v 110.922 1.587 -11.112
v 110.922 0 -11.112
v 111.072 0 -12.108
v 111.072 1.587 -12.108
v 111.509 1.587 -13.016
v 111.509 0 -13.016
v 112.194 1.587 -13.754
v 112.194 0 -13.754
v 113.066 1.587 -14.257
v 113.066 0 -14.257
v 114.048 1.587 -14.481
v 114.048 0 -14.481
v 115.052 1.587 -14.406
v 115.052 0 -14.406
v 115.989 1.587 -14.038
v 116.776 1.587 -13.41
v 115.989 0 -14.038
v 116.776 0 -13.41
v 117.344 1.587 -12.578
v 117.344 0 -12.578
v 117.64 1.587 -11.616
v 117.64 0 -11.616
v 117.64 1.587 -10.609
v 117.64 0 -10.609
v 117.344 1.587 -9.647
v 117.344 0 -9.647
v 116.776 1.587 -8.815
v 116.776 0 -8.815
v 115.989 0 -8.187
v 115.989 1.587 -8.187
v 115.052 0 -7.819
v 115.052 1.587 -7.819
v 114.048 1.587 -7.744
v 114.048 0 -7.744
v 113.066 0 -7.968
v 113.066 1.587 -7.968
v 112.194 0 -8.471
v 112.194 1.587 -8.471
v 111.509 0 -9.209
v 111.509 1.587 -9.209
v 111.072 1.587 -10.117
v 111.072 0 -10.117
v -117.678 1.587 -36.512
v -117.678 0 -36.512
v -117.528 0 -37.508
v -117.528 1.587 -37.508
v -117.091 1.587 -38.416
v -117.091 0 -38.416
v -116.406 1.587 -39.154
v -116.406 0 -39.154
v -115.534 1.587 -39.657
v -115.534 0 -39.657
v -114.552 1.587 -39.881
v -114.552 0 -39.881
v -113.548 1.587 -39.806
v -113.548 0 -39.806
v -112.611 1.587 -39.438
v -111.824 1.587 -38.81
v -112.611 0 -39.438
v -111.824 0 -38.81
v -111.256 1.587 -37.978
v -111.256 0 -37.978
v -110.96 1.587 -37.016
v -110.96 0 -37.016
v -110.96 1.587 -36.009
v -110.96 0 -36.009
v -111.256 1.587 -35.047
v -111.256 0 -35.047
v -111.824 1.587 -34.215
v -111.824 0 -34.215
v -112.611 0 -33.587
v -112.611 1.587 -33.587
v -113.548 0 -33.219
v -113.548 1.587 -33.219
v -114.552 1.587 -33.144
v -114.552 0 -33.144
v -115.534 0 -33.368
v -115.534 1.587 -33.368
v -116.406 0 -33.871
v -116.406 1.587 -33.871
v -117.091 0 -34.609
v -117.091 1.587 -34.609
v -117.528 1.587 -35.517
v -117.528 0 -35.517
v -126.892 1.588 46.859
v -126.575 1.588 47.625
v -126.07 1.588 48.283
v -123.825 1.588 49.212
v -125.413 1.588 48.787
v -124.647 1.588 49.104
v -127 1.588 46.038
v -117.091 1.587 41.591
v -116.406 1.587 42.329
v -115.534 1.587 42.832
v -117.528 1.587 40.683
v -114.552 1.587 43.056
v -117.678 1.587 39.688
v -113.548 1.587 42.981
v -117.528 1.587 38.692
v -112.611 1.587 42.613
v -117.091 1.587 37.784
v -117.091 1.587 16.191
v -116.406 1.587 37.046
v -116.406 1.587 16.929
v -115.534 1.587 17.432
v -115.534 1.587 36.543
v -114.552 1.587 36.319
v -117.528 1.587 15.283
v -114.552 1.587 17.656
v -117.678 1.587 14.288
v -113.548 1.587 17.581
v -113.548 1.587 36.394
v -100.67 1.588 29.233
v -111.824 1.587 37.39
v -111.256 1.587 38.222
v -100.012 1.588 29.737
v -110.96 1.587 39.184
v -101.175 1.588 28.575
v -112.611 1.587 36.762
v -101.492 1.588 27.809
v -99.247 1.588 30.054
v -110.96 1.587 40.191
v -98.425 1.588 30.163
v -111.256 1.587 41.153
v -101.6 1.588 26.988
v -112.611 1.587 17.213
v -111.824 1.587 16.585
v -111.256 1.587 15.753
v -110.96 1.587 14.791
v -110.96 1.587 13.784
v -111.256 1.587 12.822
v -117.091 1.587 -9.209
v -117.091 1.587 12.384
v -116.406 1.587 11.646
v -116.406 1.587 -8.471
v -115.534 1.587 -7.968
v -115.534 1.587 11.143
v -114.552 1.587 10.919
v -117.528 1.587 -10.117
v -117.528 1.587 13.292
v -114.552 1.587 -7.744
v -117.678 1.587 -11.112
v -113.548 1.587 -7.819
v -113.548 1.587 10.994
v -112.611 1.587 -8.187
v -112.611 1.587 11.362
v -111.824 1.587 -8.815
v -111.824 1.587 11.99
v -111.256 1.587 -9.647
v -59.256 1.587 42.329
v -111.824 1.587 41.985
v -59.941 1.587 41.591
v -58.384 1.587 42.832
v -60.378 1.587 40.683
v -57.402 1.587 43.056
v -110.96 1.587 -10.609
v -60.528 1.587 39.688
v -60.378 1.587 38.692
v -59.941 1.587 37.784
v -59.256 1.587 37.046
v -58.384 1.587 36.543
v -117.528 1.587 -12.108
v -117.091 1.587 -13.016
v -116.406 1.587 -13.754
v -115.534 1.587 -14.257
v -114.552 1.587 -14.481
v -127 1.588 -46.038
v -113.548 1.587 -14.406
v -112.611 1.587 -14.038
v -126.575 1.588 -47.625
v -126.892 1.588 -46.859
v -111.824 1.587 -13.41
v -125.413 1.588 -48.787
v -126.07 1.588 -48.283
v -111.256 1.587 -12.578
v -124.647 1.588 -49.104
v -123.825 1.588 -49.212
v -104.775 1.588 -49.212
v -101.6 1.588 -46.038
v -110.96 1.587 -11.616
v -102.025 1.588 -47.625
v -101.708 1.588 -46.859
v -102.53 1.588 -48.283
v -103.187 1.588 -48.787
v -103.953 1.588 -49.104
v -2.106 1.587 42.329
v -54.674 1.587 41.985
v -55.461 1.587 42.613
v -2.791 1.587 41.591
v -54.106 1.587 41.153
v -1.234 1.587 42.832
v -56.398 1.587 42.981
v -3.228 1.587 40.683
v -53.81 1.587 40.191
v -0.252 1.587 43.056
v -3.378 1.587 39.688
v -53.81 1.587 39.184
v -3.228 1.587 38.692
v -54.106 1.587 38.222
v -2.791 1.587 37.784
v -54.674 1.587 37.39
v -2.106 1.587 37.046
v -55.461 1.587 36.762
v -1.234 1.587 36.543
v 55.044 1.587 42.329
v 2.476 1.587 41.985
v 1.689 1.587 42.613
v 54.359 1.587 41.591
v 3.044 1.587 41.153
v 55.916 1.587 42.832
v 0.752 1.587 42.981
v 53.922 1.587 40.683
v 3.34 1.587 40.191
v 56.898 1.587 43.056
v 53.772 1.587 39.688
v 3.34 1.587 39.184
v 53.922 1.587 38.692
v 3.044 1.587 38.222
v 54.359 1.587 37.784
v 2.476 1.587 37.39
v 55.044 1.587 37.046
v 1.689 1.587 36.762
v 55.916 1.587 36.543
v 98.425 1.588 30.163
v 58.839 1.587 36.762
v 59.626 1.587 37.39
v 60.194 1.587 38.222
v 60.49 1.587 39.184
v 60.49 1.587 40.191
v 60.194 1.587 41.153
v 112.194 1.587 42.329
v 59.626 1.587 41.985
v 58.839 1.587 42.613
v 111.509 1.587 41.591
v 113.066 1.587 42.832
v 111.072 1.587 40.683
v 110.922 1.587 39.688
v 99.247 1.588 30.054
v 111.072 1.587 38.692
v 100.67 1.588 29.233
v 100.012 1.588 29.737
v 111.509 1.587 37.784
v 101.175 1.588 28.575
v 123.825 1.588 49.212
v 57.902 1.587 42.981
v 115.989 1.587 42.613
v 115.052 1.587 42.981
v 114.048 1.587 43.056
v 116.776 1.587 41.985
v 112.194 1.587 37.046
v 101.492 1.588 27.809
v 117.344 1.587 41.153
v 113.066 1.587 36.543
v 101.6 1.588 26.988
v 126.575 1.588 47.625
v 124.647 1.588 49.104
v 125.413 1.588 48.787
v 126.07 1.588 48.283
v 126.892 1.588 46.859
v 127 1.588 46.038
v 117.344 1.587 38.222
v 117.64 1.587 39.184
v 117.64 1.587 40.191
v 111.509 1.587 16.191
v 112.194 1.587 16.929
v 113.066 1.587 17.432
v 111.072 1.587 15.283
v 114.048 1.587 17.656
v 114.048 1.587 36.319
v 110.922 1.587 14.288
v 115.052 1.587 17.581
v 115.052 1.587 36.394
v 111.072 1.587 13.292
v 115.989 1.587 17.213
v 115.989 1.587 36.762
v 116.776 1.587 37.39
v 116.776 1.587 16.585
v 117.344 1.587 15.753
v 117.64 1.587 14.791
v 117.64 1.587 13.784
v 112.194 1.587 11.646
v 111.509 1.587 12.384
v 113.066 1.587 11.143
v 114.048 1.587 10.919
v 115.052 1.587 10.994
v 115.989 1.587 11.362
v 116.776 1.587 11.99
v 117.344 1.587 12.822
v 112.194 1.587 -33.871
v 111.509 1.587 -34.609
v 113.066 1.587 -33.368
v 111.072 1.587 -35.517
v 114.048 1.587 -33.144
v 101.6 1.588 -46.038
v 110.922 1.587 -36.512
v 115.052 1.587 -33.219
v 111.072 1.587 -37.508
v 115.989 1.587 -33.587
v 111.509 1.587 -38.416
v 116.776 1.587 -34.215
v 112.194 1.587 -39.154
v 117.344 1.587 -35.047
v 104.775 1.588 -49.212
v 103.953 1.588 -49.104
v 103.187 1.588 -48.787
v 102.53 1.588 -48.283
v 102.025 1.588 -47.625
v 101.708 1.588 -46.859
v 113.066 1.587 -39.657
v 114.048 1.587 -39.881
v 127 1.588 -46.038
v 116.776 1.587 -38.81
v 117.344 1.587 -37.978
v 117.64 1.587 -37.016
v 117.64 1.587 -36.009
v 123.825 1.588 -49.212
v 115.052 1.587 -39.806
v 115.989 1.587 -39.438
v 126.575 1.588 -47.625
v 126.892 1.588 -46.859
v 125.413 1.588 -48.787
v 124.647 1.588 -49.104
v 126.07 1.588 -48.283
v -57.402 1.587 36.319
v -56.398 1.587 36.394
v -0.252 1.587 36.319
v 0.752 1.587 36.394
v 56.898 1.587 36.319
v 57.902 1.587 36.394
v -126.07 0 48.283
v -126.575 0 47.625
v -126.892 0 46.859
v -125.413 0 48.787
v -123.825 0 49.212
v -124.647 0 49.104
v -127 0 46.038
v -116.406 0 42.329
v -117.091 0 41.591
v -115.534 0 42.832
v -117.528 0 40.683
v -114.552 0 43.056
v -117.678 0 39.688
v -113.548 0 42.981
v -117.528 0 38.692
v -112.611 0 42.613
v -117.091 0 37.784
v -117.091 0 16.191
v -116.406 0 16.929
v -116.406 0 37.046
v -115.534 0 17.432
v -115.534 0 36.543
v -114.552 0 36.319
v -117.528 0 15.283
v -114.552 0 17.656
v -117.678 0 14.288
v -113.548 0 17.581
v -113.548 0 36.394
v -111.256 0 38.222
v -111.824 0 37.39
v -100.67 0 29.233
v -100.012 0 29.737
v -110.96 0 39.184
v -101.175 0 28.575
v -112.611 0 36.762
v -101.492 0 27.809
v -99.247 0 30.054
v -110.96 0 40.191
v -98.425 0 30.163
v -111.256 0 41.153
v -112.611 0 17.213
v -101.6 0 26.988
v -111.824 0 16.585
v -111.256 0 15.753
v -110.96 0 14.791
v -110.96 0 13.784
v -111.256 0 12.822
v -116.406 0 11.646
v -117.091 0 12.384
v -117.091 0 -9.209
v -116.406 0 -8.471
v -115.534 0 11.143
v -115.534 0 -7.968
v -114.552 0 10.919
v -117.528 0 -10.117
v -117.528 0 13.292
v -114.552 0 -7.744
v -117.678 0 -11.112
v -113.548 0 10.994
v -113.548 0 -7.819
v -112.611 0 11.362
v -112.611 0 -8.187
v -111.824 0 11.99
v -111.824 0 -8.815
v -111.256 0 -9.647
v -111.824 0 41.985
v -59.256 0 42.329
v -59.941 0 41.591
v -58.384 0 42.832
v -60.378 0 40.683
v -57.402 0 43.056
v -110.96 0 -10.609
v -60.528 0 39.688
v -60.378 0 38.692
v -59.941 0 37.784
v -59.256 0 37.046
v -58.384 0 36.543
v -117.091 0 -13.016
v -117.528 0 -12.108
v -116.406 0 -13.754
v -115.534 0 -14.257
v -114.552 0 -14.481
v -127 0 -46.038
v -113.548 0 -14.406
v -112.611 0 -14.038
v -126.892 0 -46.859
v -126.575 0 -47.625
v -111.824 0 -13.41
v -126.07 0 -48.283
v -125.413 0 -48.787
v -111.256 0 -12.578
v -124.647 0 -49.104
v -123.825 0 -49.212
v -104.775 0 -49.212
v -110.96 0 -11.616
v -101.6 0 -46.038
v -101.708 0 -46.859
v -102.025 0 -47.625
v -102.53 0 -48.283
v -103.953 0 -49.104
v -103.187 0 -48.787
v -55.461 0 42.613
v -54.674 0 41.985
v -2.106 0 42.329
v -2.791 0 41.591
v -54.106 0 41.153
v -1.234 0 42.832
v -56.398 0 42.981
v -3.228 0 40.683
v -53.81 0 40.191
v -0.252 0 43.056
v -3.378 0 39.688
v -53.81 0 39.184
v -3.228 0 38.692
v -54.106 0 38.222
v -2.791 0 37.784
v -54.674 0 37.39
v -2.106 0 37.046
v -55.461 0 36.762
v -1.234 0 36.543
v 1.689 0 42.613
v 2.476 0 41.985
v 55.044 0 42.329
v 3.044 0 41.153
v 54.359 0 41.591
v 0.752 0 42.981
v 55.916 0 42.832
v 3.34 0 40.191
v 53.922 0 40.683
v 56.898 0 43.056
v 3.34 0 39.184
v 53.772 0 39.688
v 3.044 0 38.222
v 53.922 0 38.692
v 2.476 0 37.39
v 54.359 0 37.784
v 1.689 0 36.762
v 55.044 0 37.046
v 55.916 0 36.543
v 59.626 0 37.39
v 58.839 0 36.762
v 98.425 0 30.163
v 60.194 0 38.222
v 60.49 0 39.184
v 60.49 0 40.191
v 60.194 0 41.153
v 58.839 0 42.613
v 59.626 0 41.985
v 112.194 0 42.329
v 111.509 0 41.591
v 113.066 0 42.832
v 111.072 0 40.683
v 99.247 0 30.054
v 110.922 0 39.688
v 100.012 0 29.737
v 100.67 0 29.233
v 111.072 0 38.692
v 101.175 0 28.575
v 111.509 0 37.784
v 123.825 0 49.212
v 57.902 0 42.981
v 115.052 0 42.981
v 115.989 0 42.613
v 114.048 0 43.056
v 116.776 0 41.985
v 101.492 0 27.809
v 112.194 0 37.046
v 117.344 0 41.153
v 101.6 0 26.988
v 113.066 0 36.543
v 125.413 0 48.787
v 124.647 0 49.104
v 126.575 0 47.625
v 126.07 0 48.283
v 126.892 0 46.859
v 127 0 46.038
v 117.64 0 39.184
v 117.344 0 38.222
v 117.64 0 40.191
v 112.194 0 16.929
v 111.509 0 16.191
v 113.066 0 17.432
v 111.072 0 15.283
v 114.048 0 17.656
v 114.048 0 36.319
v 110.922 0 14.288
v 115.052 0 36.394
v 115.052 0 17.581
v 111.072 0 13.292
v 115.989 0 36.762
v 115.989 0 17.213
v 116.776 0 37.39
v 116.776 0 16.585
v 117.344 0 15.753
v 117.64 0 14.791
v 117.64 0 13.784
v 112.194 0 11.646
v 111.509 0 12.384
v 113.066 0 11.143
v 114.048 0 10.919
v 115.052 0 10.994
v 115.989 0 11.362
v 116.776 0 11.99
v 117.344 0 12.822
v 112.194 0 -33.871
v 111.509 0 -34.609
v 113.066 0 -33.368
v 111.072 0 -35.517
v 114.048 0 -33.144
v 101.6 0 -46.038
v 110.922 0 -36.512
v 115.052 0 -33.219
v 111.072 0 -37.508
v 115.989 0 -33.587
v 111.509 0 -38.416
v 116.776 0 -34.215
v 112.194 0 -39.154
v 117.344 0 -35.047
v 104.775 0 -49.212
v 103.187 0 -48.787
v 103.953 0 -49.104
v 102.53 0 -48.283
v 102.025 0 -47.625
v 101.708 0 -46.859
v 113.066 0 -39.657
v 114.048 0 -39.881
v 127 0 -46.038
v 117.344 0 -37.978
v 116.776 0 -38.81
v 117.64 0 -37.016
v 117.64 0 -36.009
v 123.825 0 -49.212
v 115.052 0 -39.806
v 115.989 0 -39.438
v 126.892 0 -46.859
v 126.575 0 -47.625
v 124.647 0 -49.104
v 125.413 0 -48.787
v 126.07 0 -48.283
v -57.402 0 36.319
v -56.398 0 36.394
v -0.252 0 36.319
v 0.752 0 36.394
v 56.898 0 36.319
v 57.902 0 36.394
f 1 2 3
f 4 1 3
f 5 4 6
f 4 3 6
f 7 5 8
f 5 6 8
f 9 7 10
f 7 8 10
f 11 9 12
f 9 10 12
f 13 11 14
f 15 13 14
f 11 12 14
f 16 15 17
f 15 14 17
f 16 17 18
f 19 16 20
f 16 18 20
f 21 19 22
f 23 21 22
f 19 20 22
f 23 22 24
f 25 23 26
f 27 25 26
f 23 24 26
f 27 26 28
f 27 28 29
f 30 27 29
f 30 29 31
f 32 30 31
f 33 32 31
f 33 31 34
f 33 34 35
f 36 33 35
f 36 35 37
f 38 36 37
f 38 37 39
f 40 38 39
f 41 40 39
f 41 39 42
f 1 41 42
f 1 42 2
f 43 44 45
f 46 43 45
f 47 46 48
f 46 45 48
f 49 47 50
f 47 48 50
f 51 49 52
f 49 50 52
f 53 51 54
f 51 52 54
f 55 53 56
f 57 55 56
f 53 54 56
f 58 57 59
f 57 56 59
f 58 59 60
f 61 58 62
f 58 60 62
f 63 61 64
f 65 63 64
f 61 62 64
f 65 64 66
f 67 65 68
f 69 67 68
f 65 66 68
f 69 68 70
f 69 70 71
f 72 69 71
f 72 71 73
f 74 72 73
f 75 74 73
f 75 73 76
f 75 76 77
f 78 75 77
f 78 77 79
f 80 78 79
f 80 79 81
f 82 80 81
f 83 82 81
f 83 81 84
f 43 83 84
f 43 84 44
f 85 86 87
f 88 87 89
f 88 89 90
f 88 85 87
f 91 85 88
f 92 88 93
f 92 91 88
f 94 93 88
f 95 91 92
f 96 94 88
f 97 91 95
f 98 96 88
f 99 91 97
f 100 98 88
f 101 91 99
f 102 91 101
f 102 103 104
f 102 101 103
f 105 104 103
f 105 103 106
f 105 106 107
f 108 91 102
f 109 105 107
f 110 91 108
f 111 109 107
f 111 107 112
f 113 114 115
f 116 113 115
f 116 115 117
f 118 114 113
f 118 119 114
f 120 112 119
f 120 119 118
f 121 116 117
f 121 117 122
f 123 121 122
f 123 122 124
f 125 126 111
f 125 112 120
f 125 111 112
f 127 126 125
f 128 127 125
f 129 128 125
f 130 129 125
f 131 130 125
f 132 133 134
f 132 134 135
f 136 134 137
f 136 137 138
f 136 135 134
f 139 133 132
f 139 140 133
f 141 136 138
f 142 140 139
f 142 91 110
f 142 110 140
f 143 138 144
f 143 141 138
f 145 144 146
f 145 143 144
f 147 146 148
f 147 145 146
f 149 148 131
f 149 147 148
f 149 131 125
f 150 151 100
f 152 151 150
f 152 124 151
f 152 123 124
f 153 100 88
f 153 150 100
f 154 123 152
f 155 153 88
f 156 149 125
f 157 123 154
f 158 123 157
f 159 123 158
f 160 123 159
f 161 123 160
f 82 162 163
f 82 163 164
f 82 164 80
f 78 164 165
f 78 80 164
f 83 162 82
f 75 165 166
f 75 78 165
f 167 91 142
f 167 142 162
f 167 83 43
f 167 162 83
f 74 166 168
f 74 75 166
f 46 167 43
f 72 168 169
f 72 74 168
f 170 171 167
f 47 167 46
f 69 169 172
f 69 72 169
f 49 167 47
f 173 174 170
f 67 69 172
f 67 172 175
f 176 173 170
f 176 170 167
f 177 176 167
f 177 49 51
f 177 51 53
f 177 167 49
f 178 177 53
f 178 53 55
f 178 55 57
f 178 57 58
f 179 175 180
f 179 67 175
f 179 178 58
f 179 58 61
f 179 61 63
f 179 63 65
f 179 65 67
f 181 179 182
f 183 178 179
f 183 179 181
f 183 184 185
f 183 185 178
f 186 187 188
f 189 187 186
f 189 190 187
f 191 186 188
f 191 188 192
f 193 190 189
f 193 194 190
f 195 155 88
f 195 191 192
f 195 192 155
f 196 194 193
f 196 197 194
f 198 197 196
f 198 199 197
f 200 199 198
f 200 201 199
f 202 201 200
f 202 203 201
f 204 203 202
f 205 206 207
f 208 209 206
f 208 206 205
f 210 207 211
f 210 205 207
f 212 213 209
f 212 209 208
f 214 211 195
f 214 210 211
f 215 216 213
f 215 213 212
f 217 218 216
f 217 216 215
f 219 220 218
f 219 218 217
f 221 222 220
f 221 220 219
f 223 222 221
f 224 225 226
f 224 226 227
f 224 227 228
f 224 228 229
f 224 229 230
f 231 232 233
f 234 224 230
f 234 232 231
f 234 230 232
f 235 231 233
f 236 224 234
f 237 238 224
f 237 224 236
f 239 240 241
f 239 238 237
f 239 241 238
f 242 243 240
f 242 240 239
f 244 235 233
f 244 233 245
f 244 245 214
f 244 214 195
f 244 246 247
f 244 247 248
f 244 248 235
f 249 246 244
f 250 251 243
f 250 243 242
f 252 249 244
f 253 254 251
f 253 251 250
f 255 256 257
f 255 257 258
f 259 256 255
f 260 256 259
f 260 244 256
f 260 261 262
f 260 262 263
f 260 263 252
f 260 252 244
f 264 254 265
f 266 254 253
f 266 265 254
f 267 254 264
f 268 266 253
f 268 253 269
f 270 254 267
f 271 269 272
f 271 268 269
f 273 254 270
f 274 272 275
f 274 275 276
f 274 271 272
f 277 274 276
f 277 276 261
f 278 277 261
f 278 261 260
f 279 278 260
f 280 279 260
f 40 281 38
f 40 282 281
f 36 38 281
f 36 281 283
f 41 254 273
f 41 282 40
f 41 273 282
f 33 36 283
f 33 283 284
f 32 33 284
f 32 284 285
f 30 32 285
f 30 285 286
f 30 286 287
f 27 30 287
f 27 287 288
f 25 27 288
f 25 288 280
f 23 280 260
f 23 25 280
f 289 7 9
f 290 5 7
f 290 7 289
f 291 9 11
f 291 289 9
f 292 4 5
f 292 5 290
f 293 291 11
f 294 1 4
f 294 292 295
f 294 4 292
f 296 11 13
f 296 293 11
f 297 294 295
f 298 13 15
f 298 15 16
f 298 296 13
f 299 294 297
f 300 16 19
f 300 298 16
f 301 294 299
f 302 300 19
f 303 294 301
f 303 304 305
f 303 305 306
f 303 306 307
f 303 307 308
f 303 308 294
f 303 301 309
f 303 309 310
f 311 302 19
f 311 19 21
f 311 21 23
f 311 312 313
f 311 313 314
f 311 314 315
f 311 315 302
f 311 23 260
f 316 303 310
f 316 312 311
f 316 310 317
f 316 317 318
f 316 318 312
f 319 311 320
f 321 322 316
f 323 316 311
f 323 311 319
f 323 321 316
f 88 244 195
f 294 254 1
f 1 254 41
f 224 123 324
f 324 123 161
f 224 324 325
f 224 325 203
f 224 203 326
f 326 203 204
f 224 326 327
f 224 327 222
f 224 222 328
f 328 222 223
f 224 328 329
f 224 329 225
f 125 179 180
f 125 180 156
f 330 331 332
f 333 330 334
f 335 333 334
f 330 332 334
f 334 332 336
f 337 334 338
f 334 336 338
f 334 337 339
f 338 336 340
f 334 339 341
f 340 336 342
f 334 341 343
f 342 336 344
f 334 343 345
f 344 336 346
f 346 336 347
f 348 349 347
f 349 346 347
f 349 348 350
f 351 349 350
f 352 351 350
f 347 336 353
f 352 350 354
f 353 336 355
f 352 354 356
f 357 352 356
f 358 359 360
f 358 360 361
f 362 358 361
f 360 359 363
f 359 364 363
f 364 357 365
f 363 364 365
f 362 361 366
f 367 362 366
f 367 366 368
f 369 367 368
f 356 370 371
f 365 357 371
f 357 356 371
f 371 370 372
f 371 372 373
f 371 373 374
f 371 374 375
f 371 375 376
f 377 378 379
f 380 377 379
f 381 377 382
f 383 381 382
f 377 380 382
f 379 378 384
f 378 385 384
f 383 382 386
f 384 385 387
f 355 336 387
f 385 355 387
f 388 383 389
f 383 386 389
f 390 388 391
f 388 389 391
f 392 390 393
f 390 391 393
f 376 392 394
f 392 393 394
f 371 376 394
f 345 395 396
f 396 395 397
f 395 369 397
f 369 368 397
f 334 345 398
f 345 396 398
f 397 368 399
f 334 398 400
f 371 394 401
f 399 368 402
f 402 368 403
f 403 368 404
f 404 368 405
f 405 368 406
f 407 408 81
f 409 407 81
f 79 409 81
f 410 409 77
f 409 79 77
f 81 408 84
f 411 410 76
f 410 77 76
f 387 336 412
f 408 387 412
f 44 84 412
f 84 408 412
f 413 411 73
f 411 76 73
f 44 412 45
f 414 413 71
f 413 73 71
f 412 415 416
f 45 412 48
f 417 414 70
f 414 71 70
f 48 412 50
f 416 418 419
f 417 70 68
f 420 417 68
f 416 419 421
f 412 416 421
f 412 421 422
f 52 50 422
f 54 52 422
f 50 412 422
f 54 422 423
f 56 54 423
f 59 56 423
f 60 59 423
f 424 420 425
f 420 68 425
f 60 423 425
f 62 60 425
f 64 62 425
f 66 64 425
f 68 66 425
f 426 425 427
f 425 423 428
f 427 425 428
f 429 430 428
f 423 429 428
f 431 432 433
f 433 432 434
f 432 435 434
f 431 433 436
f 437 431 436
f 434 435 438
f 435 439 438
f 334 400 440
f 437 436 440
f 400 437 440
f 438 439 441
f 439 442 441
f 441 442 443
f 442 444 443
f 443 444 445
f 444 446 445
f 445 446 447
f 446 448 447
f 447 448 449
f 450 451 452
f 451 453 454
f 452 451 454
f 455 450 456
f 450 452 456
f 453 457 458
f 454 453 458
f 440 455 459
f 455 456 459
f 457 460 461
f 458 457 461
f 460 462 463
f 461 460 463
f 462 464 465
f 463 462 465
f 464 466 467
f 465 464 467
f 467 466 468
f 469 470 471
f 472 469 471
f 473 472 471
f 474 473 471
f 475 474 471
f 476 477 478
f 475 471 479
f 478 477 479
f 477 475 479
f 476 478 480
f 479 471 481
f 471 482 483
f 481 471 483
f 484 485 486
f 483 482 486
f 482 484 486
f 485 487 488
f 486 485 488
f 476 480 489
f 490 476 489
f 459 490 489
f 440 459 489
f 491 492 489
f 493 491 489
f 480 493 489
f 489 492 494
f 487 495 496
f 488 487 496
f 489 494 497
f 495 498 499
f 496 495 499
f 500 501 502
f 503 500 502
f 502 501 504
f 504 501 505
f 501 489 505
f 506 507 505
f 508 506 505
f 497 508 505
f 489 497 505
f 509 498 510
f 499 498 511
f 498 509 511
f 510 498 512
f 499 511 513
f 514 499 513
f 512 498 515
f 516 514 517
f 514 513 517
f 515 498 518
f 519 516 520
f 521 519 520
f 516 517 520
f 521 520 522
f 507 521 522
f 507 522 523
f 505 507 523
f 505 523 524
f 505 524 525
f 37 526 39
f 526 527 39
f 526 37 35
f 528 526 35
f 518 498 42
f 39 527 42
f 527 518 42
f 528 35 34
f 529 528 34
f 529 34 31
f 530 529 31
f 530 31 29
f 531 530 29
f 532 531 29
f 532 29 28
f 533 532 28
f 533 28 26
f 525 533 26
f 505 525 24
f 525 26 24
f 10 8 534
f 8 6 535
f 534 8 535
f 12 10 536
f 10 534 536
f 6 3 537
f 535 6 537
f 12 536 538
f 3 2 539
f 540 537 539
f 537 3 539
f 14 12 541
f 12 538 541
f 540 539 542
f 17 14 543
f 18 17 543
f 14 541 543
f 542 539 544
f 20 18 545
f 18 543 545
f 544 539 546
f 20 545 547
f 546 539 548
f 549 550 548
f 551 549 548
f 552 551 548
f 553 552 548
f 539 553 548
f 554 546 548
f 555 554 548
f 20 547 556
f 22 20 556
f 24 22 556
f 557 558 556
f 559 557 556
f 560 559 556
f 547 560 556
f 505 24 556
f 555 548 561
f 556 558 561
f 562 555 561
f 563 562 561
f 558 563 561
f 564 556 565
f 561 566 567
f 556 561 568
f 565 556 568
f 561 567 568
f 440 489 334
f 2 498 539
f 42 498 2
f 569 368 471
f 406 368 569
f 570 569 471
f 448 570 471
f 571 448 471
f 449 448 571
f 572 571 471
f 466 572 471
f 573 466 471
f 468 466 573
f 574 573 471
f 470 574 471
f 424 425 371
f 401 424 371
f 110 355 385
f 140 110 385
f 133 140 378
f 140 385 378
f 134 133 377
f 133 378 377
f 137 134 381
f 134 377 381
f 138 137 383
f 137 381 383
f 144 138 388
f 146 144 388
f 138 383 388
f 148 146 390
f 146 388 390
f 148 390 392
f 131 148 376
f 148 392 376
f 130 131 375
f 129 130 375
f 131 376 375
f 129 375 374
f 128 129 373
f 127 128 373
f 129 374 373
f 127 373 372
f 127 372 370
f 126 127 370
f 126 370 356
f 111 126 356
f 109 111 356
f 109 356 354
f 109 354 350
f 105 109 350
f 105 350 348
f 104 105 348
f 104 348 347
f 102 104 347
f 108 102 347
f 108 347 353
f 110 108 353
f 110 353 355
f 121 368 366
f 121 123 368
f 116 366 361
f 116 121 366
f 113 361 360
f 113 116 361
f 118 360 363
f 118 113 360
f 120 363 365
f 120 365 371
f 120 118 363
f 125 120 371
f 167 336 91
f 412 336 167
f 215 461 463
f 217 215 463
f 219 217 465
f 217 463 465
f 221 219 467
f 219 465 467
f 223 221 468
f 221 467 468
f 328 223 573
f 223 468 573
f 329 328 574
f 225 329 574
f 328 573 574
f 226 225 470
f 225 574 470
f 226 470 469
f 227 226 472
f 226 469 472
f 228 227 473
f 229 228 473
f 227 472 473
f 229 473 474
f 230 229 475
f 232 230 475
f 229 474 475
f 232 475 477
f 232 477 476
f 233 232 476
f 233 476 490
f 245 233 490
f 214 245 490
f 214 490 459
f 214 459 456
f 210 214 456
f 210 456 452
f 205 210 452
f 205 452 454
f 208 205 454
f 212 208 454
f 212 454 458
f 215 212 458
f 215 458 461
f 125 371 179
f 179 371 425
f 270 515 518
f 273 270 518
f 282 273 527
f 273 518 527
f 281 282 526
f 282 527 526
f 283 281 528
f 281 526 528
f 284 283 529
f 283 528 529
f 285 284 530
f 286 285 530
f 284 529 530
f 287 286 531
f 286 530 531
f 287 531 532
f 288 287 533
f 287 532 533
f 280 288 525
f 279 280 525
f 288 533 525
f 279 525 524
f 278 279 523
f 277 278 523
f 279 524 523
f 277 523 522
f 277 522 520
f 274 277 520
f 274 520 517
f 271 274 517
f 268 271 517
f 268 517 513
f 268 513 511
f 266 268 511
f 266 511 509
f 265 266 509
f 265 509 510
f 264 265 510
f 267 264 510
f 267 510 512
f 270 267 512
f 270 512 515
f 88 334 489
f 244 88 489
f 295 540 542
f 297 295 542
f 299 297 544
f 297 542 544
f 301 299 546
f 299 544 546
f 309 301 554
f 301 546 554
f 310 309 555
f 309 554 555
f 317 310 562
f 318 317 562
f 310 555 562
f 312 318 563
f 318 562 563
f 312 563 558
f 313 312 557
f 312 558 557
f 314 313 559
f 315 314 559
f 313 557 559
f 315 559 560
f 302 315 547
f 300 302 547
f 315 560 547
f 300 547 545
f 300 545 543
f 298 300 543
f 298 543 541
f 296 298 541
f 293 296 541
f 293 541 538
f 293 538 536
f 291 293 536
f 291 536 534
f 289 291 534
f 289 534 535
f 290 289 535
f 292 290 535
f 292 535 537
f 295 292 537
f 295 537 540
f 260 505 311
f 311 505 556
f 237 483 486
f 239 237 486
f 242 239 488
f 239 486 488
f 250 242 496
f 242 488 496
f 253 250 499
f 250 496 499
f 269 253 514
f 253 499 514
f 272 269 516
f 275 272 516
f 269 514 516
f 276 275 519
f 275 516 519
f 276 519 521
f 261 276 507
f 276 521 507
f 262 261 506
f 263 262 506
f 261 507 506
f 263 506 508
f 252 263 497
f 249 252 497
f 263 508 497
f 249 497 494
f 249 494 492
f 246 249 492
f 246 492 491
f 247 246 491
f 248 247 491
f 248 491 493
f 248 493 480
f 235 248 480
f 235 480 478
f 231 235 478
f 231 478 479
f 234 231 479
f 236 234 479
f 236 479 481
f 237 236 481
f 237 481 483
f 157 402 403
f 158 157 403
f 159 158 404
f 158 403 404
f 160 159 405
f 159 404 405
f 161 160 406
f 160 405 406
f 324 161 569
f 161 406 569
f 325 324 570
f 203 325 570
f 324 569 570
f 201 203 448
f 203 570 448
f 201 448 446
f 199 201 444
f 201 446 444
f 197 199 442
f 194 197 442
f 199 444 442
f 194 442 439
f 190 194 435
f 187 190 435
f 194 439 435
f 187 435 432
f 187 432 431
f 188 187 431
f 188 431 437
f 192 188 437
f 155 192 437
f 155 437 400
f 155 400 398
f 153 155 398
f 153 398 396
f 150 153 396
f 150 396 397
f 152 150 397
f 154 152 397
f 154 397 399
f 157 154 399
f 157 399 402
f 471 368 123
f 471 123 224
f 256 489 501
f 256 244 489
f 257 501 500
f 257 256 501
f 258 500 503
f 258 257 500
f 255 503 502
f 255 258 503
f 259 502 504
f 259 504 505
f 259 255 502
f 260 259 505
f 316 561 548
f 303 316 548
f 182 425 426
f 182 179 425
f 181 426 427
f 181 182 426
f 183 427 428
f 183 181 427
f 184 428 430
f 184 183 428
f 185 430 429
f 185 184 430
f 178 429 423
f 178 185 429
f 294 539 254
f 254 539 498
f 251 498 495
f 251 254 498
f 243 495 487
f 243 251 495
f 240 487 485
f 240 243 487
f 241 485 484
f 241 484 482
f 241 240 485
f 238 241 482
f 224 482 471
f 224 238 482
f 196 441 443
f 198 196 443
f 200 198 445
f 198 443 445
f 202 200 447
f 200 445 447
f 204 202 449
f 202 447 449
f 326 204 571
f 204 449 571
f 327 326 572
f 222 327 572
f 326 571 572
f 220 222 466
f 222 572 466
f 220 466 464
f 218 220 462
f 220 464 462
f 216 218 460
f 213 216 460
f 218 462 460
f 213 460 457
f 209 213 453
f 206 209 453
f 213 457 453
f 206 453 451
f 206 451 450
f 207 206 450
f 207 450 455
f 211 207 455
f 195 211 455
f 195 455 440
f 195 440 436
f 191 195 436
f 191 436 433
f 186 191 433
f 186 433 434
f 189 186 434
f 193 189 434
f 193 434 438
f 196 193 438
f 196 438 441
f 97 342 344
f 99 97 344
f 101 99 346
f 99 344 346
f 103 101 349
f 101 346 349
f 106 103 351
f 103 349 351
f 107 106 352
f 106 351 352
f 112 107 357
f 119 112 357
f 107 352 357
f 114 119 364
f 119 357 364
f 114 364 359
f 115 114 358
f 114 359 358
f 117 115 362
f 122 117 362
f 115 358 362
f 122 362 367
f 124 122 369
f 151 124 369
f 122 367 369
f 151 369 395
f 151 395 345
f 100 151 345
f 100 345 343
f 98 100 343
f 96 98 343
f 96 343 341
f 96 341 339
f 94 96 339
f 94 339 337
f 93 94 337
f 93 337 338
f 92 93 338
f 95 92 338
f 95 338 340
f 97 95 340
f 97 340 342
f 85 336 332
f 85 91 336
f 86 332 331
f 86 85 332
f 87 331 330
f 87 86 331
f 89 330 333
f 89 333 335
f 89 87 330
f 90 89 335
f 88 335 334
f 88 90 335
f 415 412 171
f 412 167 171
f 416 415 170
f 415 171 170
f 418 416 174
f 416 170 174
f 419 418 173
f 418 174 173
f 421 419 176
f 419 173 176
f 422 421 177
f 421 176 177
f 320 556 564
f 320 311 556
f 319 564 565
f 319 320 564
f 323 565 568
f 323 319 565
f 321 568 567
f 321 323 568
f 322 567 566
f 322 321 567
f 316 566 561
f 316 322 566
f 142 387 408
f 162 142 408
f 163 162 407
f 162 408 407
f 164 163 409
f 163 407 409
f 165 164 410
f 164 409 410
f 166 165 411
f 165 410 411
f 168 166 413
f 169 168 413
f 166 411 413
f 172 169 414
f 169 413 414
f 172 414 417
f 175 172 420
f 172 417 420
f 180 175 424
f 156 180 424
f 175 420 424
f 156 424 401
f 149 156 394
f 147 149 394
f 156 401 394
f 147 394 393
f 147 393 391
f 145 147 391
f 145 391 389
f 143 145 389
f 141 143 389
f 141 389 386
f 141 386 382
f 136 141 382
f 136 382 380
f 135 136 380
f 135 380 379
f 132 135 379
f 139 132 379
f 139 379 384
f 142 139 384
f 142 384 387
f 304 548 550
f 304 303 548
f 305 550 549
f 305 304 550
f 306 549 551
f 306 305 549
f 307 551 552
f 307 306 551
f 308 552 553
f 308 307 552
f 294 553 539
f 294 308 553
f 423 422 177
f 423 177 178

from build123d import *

# Parameters (mm, degrees)
SKETCH1_W                     = 25.4
SKETCH1_H                     = 98.425
SKETCH1_W_2                   = 203.2
SKETCH1_H_2                   = 19.05
BOSS_EXTRUDE1_DEPTH           = 1.5875
FILLET2_R                     = 3.175
TAP_DRILL_FOR_1_4_HELICOIL0_D = 6.7564


with BuildPart() as part:
    # Sketch1 → Boss-Extrude1 (new body)
    with BuildSketch(Plane(origin=(0, 0, 0), x_dir=(1, 0, 0), z_dir=(0, 1, 0))):
        with Locations((-114.3, 0)):
            Rectangle(SKETCH1_W, SKETCH1_H)
        with Locations((0, -39.6875)):
            Rectangle(SKETCH1_W_2, SKETCH1_H_2)
        Polygon((101.6, 49.2125), (101.6, -30.1625), (101.6, -49.2125), (127, -49.2125), (127, 49.2125), align=None)
    extrude(amount=BOSS_EXTRUDE1_DEPTH)

    # Fillet2
    fillet2_edges = [part.edges().sort_by_distance(p)[0] for p in [
        (-101.6, 0.79375, 30.1625),
        (101.6, 0.79375, 30.1625),
        (101.6, 0.79375, -49.2125),
        (127, 0.79375, -49.2125),
        (127, 0.79375, 49.2125),
        (-127, 0.79375, 49.2125),
        (-127, 0.79375, -49.2125),
        (-101.6, 0.79375, -49.2125),
    ]]
    fillet(fillet2_edges, radius=FILLET2_R)

    # Tap Drill for 1/4 Helicoil0 (through all)
    with Locations(Plane(origin=(0, 1.5875, 0), x_dir=(1, 0, 0), z_dir=(0, 1, 0))):
        with Locations((-114.3, 36.5125), (-114.3, 11.1125), (-114.3, -14.2875), (-57.15, -39.6875), (0, -39.6875), (57.15, -39.6875), (114.3, -14.2875), (114.3, 11.1125), (114.3, 36.5125), (-114.3, -39.6875), (114.3, -39.6875)):
            Hole(TAP_DRILL_FOR_1_4_HELICOIL0_D / 2)


solid = part.part
